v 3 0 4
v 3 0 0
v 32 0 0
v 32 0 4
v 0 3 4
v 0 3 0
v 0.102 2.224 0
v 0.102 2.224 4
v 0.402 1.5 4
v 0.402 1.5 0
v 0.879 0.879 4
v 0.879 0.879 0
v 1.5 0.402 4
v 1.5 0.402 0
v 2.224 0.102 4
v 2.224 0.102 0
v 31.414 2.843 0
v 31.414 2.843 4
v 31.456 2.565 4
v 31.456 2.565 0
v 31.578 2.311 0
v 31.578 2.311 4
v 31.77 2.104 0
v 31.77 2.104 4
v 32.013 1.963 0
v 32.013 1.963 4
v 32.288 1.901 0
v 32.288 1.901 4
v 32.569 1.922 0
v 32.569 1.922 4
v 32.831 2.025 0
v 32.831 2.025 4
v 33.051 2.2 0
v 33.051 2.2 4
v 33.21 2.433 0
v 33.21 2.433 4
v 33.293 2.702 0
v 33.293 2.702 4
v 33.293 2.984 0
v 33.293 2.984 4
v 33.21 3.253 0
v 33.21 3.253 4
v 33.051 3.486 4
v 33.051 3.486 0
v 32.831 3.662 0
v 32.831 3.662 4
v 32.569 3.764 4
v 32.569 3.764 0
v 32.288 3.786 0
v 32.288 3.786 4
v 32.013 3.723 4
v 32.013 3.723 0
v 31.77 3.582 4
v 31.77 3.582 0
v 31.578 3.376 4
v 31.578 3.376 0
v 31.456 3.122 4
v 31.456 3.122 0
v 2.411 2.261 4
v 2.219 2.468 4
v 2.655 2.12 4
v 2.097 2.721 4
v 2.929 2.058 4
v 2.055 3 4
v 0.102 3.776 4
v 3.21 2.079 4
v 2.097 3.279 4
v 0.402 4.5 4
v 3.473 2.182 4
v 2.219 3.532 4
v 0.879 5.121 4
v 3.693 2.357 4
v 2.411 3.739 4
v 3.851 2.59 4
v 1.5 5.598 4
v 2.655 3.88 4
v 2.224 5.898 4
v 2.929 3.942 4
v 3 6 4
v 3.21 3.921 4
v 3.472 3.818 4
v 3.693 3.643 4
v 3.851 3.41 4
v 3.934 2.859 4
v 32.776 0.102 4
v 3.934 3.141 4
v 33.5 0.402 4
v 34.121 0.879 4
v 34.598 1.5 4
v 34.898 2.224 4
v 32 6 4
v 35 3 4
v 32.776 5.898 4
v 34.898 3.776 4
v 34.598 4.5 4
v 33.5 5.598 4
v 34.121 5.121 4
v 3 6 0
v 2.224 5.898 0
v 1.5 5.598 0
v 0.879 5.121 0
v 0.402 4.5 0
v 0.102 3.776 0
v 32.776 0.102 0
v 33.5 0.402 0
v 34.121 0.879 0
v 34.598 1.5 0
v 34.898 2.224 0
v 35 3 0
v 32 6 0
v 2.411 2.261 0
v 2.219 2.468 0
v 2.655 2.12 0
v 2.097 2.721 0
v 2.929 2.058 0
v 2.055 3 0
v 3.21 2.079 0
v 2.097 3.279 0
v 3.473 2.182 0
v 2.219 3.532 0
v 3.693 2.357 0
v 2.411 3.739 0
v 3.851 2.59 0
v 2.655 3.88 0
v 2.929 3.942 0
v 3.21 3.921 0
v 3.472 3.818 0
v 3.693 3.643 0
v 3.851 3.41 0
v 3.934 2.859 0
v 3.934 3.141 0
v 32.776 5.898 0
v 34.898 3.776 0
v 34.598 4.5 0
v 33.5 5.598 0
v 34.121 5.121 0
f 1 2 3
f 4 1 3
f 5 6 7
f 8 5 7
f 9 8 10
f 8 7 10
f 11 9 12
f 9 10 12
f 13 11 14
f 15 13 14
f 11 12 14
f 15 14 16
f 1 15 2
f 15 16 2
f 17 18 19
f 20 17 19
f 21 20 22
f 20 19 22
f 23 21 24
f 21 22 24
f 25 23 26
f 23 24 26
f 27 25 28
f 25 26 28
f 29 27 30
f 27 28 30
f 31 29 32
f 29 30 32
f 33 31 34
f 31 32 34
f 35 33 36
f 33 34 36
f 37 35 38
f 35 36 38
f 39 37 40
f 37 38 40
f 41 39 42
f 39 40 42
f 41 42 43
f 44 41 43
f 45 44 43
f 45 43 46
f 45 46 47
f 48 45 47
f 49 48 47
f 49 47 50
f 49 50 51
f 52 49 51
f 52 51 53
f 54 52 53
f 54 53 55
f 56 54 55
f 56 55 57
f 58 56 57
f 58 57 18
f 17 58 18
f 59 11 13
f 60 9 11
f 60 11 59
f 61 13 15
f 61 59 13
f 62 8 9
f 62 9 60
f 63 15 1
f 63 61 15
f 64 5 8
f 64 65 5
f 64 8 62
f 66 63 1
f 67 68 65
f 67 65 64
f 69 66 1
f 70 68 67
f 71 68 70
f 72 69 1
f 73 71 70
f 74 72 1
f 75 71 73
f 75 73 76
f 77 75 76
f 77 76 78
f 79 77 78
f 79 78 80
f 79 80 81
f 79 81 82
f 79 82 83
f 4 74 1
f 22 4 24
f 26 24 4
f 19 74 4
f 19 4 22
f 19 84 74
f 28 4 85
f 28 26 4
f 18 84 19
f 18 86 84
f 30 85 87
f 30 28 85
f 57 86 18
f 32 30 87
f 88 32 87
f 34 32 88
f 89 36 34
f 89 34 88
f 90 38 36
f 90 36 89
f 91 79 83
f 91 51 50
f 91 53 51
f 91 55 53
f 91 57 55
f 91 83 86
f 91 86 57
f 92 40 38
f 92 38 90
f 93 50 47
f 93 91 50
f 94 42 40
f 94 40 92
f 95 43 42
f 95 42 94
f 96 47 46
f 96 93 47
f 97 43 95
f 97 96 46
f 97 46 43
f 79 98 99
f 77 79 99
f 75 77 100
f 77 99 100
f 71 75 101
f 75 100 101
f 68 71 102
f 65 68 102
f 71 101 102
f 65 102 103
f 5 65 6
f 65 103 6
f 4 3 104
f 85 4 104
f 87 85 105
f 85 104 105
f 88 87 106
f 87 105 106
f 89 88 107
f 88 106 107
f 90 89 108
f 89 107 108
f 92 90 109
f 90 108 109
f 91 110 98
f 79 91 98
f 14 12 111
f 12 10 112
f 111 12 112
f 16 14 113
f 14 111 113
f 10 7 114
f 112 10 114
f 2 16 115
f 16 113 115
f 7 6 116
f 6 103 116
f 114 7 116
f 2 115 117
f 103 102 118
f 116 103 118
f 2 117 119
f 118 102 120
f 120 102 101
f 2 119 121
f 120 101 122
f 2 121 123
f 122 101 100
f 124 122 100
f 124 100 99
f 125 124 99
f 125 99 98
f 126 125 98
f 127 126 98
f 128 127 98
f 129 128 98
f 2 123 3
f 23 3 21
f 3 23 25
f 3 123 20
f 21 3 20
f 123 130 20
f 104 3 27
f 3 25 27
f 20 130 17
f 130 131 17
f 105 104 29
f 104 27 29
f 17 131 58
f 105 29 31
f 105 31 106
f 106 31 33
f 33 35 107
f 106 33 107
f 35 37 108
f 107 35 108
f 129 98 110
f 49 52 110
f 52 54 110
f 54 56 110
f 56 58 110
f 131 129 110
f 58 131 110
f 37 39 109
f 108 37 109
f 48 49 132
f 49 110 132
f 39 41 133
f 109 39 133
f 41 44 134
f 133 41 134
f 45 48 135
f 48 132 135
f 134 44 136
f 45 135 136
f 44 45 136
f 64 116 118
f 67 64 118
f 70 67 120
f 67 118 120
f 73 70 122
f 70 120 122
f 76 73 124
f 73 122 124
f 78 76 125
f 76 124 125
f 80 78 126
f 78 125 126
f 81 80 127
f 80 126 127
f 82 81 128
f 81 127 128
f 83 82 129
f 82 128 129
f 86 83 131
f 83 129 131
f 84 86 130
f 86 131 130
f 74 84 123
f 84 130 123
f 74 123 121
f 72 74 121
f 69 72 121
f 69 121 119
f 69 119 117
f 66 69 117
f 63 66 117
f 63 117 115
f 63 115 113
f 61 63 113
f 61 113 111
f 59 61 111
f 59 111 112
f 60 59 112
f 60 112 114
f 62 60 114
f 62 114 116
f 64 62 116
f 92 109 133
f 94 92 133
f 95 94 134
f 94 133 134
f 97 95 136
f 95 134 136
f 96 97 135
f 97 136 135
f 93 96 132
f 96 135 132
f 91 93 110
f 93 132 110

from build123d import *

# Parameters (mm, degrees)
F1_DEPTH = 4
F3_D     = 1.89
F5_D     = 1.89


with BuildPart() as f1:
    # F0 (on Top) → F1 (new body)
    with BuildSketch(Plane.XY):
        with BuildLine():
            ThreePointArc((0, 3), (0.8786796564, 0.8786796564), (3, 0))
            Line((3, 0), (32, 0))
            ThreePointArc((32, 0), (34.1213203436, 0.8786796564), (35, 3))
            ThreePointArc((35, 3), (34.1213203436, 5.1213203436), (32, 6))
            Line((32, 6), (3, 6))
            ThreePointArc((3, 6), (0.8786796564, 5.1213203436), (0, 3))
        make_face()
    extrude(amount=F1_DEPTH)

    # F3 (through all)
    with Locations(Plane.XY.offset(4)):
        with Locations((3, 3)):
            Hole(F3_D / 2)

    # F5 (through all)
    with Locations(Plane(origin=(0, 0, 0), x_dir=(1, 0, 0), z_dir=(0, 0, -1))):
        with Locations((32.3587208986, -2.8431627434)):
            Hole(F5_D / 2)


solid = f1.part
